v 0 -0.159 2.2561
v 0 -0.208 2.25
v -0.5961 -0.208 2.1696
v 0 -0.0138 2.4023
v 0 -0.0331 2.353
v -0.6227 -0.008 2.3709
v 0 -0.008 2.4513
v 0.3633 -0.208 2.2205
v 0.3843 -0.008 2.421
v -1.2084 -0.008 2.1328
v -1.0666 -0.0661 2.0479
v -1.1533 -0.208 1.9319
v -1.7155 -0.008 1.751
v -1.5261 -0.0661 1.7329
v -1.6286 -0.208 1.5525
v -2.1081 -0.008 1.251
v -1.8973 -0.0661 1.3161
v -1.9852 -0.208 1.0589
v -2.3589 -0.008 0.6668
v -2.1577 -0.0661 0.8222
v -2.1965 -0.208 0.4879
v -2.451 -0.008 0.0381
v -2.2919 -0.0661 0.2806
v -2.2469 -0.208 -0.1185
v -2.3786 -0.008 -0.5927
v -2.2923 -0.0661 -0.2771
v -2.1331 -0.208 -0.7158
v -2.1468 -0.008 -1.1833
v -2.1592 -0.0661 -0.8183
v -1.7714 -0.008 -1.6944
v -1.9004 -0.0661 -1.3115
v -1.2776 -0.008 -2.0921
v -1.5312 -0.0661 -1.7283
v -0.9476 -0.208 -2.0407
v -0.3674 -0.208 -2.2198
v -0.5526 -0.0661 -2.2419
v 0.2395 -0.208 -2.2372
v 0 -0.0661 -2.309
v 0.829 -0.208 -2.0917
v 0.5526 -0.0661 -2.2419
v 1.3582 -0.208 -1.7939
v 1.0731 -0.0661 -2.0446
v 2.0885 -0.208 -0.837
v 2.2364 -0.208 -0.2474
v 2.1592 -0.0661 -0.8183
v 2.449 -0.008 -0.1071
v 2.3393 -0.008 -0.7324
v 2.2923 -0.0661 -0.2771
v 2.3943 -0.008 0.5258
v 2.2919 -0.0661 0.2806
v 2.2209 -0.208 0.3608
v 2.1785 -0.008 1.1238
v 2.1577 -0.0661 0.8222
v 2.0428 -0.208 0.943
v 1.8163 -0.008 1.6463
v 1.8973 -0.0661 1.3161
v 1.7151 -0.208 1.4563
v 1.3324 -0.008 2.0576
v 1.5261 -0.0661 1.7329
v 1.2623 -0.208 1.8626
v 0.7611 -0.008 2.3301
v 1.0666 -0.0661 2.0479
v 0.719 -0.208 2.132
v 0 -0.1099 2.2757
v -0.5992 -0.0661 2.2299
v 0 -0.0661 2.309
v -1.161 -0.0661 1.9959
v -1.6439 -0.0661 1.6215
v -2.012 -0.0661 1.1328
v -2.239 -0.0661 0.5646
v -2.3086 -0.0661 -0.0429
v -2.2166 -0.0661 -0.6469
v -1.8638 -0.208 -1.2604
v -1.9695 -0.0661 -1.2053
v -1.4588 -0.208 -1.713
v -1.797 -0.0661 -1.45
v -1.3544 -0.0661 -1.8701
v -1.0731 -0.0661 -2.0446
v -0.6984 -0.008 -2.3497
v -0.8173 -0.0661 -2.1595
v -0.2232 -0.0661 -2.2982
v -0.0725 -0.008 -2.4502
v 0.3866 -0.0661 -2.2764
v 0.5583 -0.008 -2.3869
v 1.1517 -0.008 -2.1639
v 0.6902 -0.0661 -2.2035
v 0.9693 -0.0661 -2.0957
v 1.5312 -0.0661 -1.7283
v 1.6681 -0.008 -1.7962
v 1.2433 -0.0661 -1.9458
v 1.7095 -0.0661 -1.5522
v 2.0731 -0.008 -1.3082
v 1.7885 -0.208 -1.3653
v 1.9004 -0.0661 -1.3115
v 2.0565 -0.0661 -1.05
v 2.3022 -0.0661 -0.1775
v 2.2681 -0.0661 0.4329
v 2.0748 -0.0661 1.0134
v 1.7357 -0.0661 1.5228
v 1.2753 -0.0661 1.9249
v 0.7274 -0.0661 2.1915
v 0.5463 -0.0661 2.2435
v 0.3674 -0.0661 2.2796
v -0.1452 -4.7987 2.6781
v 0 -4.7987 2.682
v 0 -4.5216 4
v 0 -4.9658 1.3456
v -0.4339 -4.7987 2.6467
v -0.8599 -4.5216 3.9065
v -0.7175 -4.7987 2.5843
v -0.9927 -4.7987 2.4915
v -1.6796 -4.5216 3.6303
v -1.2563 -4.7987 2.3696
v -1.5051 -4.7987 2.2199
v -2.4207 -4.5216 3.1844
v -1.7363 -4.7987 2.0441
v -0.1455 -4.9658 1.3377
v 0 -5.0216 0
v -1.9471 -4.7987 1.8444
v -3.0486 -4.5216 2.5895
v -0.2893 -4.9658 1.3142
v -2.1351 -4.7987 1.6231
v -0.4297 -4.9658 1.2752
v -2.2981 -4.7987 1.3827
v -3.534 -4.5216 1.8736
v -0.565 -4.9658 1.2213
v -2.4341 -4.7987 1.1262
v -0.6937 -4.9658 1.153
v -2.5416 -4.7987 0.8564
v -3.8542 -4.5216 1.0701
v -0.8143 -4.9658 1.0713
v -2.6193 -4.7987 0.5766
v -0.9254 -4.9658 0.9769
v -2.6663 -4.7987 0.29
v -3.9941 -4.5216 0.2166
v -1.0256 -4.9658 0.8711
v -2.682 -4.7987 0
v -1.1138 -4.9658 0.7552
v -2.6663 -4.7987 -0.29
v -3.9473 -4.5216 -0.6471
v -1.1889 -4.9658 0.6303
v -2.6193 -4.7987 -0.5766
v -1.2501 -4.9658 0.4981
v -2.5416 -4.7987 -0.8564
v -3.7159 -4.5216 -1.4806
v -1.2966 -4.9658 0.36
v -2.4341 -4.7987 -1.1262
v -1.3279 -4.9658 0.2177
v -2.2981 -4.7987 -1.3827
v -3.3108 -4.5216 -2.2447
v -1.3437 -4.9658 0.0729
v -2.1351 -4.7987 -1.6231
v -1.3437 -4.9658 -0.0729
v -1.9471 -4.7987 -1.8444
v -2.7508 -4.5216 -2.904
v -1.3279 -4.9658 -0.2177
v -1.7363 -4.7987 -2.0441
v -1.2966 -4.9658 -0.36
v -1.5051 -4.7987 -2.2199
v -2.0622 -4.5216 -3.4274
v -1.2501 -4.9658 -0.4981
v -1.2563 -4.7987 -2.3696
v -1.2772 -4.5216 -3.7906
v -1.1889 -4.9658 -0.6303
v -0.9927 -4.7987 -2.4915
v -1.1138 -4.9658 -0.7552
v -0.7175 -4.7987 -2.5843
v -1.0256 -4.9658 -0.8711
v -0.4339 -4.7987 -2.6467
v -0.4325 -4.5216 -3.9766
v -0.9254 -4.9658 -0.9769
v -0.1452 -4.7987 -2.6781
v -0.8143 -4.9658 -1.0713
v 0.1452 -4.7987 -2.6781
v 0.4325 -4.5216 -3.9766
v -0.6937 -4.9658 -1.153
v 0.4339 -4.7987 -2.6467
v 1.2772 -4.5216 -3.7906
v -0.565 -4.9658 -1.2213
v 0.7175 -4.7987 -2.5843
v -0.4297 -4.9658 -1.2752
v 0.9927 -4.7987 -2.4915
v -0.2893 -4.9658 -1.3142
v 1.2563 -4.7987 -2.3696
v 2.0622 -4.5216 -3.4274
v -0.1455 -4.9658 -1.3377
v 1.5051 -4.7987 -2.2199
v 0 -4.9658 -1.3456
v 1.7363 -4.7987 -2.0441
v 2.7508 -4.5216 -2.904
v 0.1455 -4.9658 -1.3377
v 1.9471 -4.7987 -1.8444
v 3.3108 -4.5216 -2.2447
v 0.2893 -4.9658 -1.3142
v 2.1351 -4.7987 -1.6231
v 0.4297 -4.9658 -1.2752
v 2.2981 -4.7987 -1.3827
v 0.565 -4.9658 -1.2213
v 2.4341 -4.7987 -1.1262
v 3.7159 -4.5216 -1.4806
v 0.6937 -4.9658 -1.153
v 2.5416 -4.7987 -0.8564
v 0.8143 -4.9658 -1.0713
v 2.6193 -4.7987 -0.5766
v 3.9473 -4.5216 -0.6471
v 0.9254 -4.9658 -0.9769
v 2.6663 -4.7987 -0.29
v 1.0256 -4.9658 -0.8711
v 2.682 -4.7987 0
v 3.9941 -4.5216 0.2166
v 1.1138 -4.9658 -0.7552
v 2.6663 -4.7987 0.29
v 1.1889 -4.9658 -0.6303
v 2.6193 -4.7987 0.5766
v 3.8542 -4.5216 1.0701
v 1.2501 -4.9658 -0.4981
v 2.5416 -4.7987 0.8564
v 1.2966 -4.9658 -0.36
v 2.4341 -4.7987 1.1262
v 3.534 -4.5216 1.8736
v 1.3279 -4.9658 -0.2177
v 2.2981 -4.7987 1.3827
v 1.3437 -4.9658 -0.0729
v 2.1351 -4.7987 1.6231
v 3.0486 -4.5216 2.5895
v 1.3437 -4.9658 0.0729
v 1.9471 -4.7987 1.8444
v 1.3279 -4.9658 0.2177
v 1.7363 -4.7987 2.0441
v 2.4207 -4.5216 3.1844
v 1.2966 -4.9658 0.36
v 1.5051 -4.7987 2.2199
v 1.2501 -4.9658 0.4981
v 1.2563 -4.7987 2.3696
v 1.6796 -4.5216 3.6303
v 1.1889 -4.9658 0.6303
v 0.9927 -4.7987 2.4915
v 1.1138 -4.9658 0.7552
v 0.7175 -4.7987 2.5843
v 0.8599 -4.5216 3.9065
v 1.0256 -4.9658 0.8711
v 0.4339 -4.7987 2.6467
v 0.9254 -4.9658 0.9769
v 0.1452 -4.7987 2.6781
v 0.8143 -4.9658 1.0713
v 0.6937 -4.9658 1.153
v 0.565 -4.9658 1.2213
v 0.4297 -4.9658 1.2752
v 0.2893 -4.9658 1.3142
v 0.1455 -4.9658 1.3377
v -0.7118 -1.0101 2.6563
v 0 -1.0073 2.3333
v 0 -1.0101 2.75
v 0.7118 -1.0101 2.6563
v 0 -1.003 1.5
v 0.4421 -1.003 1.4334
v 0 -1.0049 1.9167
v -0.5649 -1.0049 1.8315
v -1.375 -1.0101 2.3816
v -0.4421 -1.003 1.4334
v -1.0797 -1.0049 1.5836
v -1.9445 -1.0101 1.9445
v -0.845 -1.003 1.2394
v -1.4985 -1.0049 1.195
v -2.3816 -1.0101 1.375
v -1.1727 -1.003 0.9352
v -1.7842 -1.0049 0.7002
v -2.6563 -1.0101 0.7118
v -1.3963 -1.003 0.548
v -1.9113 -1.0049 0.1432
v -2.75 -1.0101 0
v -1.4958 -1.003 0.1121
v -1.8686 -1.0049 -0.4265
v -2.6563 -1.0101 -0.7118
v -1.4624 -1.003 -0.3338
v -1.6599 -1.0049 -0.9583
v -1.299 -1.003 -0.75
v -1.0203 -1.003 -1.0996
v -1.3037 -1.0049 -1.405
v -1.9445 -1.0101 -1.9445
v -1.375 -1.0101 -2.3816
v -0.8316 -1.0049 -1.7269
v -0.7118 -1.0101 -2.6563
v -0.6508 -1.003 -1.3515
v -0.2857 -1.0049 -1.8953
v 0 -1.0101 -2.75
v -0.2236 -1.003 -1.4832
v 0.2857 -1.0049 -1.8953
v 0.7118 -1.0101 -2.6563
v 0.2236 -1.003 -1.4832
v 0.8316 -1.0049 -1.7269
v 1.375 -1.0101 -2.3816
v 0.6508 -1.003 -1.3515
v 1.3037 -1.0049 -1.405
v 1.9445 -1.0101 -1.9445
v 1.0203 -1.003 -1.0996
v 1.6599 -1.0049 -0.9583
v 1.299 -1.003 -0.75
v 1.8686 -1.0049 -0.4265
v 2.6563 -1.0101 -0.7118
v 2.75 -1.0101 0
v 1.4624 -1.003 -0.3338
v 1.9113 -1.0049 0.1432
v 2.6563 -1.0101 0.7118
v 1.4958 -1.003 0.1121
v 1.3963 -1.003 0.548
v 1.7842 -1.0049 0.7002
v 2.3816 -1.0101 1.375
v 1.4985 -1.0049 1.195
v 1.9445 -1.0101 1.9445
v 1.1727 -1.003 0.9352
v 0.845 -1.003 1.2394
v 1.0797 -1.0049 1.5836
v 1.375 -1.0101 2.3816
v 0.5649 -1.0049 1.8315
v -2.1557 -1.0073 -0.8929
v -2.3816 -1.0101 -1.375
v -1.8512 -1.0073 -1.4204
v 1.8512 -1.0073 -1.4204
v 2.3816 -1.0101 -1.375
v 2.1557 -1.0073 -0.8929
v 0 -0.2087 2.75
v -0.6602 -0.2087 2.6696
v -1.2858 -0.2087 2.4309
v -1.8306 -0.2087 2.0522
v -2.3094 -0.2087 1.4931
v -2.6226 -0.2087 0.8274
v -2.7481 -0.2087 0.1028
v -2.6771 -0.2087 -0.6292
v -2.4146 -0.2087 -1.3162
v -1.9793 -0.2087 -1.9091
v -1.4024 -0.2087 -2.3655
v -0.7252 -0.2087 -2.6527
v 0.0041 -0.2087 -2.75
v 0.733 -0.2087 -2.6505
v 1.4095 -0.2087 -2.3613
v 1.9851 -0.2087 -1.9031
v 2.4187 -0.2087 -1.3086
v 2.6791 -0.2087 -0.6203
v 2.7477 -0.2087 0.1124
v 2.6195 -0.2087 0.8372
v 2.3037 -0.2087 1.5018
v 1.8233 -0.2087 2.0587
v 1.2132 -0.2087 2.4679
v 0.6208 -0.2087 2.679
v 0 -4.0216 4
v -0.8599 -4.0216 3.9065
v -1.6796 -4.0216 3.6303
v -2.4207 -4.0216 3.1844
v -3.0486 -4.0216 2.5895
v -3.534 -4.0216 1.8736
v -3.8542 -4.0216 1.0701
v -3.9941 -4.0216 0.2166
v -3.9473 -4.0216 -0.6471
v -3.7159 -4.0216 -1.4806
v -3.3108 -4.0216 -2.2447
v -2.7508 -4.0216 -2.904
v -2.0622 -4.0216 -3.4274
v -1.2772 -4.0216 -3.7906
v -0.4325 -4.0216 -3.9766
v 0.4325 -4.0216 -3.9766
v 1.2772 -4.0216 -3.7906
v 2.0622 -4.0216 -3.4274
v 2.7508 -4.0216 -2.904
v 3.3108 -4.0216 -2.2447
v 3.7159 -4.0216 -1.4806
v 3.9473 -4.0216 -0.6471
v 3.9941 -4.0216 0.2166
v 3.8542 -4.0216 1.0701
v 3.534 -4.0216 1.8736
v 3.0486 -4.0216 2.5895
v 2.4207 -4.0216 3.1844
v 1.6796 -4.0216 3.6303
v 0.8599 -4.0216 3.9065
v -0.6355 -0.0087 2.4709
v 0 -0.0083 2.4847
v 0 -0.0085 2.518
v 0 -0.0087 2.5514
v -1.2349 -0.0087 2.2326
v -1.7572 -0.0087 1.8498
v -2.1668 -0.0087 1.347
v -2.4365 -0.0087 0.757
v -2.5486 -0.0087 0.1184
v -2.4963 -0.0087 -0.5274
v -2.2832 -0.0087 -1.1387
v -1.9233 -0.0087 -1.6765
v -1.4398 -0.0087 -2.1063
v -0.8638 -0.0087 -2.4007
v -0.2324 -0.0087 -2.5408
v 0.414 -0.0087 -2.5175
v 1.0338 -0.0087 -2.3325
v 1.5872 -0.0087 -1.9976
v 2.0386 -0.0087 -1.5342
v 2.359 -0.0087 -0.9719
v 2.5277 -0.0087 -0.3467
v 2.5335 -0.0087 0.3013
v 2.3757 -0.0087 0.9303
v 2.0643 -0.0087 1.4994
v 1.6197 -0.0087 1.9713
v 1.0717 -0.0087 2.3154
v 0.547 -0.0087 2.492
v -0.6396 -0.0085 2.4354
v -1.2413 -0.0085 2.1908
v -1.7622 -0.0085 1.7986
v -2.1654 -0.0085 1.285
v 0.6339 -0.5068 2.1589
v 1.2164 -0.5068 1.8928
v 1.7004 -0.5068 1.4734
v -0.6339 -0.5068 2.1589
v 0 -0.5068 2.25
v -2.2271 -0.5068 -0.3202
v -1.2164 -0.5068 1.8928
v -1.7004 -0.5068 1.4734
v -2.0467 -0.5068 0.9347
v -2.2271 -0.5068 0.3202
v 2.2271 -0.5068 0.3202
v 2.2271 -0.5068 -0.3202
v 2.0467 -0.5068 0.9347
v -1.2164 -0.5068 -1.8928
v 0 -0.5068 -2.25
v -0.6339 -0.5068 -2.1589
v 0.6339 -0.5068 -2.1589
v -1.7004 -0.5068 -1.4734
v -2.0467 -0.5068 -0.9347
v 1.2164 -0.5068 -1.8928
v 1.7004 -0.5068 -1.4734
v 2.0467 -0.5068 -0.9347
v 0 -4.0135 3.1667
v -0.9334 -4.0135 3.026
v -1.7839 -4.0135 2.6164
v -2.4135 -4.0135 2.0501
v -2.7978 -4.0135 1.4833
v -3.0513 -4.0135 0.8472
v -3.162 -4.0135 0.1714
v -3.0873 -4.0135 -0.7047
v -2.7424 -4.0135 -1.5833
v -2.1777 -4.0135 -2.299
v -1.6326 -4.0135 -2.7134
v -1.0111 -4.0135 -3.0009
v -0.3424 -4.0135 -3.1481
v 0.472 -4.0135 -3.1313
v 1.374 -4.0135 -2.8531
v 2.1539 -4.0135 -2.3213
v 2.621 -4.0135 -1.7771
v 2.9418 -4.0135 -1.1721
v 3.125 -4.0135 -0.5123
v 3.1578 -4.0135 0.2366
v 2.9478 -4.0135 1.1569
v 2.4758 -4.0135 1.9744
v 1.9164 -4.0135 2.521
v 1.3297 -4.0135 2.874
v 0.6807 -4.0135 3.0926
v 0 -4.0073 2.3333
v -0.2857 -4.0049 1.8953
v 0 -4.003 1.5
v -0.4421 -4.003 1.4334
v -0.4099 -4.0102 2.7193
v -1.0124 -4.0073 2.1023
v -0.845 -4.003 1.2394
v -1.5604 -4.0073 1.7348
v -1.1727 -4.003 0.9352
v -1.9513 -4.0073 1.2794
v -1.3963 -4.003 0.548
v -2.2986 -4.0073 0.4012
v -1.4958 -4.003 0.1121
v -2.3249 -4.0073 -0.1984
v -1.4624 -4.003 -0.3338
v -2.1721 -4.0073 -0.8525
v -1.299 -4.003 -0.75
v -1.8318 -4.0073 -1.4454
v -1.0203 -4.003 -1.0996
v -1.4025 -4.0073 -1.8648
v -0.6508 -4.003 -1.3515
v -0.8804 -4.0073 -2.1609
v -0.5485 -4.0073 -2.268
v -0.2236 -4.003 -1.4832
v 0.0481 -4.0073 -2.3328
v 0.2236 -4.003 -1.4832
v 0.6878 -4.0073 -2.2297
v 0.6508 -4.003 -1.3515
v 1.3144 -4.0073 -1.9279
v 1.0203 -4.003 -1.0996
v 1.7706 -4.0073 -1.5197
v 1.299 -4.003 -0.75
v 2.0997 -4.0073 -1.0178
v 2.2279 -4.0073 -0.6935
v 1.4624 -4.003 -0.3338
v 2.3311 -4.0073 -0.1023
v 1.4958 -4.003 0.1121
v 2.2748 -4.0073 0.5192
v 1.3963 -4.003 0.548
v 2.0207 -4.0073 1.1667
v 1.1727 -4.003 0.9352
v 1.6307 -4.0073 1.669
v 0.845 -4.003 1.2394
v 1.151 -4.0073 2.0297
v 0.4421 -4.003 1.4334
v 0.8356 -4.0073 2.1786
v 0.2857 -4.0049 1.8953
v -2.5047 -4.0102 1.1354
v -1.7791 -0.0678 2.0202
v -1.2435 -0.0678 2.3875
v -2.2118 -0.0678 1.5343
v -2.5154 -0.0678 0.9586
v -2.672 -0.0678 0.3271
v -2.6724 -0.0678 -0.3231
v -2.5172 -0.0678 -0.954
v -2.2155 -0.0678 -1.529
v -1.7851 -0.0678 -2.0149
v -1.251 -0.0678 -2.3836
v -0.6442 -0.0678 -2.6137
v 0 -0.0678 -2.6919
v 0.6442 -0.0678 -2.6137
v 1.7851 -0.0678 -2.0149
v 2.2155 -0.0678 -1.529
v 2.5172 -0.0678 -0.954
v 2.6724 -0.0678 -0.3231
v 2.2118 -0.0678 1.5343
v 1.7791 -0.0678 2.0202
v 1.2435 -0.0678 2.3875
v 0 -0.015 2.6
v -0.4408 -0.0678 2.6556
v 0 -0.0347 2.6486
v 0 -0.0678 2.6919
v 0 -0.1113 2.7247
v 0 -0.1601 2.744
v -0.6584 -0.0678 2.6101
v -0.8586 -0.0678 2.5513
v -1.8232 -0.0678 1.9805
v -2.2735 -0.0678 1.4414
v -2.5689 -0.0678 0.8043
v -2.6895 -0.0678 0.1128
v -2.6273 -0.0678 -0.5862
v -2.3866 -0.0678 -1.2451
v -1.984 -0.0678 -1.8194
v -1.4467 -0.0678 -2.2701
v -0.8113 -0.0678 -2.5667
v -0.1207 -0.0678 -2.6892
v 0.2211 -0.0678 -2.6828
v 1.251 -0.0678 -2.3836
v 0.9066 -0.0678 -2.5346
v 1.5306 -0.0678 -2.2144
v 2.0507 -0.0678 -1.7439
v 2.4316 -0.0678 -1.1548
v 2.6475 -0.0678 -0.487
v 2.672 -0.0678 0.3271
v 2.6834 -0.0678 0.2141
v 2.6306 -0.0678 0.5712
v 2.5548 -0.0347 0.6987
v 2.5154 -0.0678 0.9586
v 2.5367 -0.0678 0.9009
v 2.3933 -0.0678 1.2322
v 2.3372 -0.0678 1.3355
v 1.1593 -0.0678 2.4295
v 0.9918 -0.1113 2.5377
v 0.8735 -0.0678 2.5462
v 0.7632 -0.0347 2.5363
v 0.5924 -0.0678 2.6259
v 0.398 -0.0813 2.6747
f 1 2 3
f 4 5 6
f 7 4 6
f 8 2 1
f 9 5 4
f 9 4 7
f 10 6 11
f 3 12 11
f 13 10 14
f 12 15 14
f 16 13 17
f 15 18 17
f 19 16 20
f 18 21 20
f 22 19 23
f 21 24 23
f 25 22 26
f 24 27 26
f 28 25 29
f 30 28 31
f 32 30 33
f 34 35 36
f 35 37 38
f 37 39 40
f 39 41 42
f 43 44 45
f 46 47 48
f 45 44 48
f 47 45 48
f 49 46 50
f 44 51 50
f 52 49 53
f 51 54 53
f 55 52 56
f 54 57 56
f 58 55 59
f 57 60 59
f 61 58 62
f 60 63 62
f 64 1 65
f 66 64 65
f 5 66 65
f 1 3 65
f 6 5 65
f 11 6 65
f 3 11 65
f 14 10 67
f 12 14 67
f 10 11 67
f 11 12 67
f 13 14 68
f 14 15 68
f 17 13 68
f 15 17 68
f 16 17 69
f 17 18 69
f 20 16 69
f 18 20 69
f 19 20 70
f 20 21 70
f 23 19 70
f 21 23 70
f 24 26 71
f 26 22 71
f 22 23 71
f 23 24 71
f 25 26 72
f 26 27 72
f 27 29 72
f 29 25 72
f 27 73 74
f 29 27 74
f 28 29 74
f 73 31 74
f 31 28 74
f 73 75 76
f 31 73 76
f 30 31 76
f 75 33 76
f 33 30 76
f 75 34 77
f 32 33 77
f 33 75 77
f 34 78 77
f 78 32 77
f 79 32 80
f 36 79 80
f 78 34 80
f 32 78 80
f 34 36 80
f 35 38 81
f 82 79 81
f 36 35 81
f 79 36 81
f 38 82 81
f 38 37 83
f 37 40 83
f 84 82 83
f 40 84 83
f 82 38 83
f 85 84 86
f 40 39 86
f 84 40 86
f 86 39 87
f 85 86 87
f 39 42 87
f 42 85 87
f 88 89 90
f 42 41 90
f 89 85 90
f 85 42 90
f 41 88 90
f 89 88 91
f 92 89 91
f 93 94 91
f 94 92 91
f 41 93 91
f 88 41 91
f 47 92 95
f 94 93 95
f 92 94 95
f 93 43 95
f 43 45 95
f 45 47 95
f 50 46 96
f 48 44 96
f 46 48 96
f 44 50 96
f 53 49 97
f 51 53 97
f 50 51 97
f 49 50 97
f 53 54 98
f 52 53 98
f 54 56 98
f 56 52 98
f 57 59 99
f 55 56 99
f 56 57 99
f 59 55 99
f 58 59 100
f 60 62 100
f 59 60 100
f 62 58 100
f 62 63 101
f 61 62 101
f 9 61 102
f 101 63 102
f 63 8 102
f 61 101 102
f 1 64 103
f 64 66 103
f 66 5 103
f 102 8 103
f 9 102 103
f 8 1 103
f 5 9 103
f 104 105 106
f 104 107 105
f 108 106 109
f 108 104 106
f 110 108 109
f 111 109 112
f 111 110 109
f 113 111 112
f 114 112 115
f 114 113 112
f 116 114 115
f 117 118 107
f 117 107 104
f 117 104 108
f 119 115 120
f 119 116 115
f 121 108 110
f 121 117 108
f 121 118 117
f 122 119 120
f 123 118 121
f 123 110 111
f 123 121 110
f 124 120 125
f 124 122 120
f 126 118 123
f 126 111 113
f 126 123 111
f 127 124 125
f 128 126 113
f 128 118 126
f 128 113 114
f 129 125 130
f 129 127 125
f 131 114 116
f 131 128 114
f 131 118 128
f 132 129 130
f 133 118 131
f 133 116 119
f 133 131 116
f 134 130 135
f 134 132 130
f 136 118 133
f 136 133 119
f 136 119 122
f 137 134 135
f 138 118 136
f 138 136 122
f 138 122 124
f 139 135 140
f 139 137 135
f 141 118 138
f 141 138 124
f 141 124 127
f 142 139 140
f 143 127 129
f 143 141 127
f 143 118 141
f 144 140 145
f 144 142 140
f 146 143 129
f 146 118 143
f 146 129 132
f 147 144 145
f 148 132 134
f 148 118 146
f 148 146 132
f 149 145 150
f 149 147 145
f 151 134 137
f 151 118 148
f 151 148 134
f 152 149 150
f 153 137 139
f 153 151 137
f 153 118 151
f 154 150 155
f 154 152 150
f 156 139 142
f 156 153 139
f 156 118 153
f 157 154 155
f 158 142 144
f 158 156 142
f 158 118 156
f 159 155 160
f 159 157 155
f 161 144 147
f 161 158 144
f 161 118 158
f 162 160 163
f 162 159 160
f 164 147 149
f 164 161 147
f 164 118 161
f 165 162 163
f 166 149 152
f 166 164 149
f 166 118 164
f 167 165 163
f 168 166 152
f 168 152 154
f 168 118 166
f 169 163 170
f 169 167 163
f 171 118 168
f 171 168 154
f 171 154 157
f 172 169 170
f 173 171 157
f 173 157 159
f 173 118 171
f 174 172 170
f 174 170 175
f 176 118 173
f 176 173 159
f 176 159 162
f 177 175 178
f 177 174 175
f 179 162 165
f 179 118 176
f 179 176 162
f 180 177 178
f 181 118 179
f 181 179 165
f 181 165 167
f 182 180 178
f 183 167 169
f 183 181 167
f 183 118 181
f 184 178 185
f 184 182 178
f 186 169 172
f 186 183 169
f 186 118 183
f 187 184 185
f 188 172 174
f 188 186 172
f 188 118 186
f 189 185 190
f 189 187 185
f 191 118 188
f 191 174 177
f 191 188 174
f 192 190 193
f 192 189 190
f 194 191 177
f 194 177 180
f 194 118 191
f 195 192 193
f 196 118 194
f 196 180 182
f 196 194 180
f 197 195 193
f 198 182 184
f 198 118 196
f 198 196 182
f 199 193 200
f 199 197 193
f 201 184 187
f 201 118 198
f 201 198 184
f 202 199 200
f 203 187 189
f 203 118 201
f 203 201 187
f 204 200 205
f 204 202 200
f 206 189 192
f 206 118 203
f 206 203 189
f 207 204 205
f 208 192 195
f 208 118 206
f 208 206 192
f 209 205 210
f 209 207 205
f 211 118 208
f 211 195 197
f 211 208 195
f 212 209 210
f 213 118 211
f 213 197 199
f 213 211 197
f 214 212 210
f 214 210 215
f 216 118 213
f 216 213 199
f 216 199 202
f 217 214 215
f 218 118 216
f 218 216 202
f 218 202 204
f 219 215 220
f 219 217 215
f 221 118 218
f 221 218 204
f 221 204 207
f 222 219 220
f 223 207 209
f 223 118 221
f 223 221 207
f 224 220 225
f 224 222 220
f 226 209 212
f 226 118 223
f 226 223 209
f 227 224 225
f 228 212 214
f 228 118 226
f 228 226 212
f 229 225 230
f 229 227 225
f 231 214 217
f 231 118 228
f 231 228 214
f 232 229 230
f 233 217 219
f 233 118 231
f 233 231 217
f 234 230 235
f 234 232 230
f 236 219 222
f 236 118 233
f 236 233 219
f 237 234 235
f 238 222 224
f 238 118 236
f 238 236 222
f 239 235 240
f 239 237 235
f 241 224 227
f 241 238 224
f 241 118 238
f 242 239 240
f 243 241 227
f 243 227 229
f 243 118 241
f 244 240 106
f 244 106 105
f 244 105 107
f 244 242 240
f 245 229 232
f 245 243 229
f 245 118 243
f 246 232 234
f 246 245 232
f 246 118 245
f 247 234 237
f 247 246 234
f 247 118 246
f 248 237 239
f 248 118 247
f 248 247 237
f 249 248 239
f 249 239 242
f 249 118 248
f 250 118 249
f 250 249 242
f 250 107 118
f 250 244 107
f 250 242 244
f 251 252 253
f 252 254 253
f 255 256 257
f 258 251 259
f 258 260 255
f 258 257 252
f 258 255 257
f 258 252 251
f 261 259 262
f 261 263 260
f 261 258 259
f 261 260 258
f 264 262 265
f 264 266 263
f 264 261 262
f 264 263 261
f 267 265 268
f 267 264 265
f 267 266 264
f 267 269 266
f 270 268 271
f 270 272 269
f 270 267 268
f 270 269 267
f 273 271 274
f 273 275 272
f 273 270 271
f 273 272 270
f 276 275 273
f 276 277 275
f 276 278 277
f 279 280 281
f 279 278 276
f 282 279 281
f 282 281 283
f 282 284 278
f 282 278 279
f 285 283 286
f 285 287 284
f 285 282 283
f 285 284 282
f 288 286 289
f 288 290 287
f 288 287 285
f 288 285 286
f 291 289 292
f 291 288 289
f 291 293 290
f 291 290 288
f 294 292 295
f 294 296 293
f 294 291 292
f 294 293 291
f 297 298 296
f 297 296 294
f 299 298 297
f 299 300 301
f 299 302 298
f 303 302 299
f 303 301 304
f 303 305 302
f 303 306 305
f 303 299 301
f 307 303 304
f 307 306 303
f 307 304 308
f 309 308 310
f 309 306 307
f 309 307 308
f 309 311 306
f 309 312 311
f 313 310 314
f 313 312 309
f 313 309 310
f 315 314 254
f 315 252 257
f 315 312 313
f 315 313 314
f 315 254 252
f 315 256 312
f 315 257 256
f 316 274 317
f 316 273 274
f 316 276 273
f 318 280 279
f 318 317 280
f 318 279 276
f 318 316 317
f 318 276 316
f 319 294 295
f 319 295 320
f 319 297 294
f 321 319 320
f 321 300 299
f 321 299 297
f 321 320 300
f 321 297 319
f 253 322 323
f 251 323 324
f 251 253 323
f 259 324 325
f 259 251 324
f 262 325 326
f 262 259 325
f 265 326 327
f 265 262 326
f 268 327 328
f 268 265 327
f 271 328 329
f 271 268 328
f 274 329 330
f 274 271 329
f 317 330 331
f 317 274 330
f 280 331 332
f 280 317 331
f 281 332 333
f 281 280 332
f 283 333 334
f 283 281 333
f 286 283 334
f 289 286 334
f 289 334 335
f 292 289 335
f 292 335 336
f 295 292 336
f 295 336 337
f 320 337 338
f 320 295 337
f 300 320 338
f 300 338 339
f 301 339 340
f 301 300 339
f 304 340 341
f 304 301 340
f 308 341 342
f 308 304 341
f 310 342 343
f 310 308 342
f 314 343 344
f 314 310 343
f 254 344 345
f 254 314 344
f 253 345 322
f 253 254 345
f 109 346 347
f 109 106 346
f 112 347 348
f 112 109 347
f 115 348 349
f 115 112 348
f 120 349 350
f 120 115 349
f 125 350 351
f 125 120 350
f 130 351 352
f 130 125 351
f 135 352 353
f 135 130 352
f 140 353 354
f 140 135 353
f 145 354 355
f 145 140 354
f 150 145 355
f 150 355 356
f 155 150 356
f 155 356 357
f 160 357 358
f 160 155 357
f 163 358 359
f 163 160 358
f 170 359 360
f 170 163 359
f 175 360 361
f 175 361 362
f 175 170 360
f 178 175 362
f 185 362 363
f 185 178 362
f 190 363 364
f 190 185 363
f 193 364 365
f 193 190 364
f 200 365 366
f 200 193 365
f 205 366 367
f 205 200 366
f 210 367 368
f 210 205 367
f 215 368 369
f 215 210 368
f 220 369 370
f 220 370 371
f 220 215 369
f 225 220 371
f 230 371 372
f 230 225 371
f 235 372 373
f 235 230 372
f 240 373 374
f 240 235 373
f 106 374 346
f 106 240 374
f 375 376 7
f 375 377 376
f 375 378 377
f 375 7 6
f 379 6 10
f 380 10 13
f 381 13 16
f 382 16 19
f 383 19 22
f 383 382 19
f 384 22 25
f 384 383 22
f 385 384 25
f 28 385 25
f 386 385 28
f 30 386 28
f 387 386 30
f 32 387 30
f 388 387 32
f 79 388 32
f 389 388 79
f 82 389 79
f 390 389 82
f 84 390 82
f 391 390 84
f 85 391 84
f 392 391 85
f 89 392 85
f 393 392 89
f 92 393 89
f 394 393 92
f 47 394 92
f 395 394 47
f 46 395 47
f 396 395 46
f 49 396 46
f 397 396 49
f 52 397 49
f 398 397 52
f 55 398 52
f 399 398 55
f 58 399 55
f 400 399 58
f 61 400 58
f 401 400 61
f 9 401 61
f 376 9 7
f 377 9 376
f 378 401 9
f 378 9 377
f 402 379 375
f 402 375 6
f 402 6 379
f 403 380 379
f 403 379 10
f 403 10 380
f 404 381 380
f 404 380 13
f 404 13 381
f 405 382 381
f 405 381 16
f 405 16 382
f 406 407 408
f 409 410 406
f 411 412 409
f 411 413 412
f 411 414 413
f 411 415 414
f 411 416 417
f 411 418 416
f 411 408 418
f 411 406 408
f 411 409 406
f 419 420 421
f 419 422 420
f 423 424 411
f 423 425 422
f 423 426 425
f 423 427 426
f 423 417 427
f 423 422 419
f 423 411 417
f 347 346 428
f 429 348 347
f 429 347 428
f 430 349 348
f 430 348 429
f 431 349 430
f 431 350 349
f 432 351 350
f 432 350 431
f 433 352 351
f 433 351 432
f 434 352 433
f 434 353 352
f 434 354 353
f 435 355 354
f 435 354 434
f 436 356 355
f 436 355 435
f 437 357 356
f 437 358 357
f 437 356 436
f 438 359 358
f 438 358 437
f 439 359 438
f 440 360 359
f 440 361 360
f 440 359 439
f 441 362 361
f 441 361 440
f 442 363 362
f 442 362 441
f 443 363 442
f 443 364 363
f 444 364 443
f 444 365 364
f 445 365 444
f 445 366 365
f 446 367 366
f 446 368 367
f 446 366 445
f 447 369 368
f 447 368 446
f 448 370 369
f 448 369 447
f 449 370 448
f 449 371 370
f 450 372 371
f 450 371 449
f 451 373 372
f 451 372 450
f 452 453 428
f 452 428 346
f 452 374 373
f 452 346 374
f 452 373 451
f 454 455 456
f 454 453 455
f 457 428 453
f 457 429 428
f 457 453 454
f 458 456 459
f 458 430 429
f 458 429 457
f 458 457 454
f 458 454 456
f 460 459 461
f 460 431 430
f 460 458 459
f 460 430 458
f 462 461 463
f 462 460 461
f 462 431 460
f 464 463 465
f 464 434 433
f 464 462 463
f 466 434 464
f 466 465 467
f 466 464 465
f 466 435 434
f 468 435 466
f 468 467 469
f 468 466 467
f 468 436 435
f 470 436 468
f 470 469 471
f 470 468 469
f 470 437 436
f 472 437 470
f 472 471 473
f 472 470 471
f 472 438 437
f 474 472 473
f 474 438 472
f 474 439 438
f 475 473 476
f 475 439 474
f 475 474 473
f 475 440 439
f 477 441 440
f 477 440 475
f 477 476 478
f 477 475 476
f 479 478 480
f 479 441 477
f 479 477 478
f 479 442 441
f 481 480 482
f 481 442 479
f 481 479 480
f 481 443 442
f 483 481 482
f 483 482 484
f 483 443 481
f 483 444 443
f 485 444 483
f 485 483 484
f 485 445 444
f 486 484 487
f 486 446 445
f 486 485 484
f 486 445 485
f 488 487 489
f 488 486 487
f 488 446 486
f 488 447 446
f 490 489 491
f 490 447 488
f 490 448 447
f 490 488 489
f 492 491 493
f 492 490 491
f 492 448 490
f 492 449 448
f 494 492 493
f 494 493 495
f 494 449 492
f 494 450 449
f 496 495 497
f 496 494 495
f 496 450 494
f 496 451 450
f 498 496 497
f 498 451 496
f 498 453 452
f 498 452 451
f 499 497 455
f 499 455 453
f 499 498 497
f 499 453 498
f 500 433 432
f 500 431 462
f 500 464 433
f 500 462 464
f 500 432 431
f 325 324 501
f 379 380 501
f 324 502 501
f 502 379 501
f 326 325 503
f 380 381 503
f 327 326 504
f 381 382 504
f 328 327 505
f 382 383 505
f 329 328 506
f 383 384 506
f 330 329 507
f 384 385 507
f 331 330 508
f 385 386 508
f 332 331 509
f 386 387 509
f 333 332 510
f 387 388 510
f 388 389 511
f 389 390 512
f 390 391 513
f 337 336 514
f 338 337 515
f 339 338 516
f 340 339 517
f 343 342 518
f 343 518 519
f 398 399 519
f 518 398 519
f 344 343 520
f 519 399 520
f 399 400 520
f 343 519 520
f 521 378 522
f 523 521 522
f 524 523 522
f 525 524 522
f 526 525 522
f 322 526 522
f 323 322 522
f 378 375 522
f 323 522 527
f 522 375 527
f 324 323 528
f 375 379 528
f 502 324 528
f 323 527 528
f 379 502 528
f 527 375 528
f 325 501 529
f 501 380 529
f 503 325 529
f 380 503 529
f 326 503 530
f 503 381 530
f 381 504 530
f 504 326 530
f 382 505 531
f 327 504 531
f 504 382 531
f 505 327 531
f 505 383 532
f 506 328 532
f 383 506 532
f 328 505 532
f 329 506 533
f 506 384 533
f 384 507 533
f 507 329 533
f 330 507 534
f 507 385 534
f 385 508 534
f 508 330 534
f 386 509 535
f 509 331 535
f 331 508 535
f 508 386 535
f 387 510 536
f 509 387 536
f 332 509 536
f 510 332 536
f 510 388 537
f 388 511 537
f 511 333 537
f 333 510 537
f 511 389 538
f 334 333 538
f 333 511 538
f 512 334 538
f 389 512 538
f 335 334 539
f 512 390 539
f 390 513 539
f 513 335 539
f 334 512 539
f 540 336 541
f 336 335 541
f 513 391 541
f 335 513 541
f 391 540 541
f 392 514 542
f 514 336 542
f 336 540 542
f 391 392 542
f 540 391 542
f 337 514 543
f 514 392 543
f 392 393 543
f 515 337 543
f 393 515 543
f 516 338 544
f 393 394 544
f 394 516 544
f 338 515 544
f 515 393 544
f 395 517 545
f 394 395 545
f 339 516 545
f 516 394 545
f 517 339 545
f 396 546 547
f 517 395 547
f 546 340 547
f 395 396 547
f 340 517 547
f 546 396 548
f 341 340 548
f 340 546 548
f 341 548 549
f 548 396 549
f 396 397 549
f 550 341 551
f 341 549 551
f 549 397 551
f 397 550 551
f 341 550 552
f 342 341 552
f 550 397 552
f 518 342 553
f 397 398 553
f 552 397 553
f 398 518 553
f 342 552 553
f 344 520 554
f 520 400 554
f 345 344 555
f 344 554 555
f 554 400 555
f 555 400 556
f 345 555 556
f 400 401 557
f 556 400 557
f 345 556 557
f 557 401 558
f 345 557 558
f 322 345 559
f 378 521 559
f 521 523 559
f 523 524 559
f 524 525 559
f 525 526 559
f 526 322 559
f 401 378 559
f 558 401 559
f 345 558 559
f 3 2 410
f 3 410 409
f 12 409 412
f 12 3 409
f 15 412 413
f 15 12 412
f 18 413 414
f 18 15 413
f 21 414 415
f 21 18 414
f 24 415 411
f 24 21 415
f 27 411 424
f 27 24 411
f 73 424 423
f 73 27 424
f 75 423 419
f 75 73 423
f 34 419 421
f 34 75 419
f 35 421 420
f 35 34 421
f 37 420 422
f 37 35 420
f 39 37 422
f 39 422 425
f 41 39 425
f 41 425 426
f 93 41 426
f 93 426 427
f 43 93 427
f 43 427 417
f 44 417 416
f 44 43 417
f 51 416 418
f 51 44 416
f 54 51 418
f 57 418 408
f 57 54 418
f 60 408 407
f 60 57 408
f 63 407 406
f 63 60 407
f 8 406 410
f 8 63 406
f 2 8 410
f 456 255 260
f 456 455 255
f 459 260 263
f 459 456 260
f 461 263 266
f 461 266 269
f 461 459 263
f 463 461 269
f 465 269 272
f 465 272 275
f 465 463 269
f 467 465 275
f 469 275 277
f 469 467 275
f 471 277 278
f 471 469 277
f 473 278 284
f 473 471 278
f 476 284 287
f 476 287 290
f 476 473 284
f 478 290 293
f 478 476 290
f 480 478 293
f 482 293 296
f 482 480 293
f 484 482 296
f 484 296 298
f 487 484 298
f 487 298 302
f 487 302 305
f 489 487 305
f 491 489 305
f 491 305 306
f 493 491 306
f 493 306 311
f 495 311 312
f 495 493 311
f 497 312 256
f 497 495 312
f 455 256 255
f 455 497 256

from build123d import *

# Parameters (mm, degrees)
CONG_1_R = 0.2


with BuildPart() as part:
    # Esquisse1 → Révolution1 (revolve)
    with BuildSketch(Plane.XY, mode=Mode.PRIVATE) as r_volution1_sk:
        with BuildLine():
            Line((-1.5, -1.002988992), (-1.5, -4.003013447))
            ThreePointArc((-1.5, -4.003013447), (-2.750015694, -4.010192747), (-4, -4.021595148))
            Line((-4, -4.021595148), (-4, -4.521595148))
            ThreePointArc((-4, -4.521595148), (-2.015564437, -4.896110644), (0, -5.021595148))
            Line((0, -5.021595148), (0, -0.50676811))
            Line((0, -0.50676811), (-2.25, -0.50676811))
            Line((-2.25, -0.50676811), (-2.25, -0.00676811))
            ThreePointArc((-2.25, -0.00676811), (-2.500000559, -0.008355713), (-2.75, -0.010110432))
            Line((-2.75, -0.010110432), (-2.75, -1.010110432))
            ThreePointArc((-2.75, -1.010110432), (-2.125002983, -1.006026077), (-1.5, -1.002988992))
        make_face()
    revolve(r_volution1_sk.sketch.rotate(Axis((0, 39.029541446, 0), (0, -1, 0)), 270), axis=Axis((0, 39.029541446, 0), (0, -1, 0)))  # turned: the seam where the file's is

    # Congé1
    cong_1_edges = [part.edges().sort_by_distance(p)[0] for p in [
        (0, -0.010110432, -2.75),
        (0, -0.00676811, -2.25),
    ]]
    fillet(cong_1_edges, radius=CONG_1_R)


solid = part.part
